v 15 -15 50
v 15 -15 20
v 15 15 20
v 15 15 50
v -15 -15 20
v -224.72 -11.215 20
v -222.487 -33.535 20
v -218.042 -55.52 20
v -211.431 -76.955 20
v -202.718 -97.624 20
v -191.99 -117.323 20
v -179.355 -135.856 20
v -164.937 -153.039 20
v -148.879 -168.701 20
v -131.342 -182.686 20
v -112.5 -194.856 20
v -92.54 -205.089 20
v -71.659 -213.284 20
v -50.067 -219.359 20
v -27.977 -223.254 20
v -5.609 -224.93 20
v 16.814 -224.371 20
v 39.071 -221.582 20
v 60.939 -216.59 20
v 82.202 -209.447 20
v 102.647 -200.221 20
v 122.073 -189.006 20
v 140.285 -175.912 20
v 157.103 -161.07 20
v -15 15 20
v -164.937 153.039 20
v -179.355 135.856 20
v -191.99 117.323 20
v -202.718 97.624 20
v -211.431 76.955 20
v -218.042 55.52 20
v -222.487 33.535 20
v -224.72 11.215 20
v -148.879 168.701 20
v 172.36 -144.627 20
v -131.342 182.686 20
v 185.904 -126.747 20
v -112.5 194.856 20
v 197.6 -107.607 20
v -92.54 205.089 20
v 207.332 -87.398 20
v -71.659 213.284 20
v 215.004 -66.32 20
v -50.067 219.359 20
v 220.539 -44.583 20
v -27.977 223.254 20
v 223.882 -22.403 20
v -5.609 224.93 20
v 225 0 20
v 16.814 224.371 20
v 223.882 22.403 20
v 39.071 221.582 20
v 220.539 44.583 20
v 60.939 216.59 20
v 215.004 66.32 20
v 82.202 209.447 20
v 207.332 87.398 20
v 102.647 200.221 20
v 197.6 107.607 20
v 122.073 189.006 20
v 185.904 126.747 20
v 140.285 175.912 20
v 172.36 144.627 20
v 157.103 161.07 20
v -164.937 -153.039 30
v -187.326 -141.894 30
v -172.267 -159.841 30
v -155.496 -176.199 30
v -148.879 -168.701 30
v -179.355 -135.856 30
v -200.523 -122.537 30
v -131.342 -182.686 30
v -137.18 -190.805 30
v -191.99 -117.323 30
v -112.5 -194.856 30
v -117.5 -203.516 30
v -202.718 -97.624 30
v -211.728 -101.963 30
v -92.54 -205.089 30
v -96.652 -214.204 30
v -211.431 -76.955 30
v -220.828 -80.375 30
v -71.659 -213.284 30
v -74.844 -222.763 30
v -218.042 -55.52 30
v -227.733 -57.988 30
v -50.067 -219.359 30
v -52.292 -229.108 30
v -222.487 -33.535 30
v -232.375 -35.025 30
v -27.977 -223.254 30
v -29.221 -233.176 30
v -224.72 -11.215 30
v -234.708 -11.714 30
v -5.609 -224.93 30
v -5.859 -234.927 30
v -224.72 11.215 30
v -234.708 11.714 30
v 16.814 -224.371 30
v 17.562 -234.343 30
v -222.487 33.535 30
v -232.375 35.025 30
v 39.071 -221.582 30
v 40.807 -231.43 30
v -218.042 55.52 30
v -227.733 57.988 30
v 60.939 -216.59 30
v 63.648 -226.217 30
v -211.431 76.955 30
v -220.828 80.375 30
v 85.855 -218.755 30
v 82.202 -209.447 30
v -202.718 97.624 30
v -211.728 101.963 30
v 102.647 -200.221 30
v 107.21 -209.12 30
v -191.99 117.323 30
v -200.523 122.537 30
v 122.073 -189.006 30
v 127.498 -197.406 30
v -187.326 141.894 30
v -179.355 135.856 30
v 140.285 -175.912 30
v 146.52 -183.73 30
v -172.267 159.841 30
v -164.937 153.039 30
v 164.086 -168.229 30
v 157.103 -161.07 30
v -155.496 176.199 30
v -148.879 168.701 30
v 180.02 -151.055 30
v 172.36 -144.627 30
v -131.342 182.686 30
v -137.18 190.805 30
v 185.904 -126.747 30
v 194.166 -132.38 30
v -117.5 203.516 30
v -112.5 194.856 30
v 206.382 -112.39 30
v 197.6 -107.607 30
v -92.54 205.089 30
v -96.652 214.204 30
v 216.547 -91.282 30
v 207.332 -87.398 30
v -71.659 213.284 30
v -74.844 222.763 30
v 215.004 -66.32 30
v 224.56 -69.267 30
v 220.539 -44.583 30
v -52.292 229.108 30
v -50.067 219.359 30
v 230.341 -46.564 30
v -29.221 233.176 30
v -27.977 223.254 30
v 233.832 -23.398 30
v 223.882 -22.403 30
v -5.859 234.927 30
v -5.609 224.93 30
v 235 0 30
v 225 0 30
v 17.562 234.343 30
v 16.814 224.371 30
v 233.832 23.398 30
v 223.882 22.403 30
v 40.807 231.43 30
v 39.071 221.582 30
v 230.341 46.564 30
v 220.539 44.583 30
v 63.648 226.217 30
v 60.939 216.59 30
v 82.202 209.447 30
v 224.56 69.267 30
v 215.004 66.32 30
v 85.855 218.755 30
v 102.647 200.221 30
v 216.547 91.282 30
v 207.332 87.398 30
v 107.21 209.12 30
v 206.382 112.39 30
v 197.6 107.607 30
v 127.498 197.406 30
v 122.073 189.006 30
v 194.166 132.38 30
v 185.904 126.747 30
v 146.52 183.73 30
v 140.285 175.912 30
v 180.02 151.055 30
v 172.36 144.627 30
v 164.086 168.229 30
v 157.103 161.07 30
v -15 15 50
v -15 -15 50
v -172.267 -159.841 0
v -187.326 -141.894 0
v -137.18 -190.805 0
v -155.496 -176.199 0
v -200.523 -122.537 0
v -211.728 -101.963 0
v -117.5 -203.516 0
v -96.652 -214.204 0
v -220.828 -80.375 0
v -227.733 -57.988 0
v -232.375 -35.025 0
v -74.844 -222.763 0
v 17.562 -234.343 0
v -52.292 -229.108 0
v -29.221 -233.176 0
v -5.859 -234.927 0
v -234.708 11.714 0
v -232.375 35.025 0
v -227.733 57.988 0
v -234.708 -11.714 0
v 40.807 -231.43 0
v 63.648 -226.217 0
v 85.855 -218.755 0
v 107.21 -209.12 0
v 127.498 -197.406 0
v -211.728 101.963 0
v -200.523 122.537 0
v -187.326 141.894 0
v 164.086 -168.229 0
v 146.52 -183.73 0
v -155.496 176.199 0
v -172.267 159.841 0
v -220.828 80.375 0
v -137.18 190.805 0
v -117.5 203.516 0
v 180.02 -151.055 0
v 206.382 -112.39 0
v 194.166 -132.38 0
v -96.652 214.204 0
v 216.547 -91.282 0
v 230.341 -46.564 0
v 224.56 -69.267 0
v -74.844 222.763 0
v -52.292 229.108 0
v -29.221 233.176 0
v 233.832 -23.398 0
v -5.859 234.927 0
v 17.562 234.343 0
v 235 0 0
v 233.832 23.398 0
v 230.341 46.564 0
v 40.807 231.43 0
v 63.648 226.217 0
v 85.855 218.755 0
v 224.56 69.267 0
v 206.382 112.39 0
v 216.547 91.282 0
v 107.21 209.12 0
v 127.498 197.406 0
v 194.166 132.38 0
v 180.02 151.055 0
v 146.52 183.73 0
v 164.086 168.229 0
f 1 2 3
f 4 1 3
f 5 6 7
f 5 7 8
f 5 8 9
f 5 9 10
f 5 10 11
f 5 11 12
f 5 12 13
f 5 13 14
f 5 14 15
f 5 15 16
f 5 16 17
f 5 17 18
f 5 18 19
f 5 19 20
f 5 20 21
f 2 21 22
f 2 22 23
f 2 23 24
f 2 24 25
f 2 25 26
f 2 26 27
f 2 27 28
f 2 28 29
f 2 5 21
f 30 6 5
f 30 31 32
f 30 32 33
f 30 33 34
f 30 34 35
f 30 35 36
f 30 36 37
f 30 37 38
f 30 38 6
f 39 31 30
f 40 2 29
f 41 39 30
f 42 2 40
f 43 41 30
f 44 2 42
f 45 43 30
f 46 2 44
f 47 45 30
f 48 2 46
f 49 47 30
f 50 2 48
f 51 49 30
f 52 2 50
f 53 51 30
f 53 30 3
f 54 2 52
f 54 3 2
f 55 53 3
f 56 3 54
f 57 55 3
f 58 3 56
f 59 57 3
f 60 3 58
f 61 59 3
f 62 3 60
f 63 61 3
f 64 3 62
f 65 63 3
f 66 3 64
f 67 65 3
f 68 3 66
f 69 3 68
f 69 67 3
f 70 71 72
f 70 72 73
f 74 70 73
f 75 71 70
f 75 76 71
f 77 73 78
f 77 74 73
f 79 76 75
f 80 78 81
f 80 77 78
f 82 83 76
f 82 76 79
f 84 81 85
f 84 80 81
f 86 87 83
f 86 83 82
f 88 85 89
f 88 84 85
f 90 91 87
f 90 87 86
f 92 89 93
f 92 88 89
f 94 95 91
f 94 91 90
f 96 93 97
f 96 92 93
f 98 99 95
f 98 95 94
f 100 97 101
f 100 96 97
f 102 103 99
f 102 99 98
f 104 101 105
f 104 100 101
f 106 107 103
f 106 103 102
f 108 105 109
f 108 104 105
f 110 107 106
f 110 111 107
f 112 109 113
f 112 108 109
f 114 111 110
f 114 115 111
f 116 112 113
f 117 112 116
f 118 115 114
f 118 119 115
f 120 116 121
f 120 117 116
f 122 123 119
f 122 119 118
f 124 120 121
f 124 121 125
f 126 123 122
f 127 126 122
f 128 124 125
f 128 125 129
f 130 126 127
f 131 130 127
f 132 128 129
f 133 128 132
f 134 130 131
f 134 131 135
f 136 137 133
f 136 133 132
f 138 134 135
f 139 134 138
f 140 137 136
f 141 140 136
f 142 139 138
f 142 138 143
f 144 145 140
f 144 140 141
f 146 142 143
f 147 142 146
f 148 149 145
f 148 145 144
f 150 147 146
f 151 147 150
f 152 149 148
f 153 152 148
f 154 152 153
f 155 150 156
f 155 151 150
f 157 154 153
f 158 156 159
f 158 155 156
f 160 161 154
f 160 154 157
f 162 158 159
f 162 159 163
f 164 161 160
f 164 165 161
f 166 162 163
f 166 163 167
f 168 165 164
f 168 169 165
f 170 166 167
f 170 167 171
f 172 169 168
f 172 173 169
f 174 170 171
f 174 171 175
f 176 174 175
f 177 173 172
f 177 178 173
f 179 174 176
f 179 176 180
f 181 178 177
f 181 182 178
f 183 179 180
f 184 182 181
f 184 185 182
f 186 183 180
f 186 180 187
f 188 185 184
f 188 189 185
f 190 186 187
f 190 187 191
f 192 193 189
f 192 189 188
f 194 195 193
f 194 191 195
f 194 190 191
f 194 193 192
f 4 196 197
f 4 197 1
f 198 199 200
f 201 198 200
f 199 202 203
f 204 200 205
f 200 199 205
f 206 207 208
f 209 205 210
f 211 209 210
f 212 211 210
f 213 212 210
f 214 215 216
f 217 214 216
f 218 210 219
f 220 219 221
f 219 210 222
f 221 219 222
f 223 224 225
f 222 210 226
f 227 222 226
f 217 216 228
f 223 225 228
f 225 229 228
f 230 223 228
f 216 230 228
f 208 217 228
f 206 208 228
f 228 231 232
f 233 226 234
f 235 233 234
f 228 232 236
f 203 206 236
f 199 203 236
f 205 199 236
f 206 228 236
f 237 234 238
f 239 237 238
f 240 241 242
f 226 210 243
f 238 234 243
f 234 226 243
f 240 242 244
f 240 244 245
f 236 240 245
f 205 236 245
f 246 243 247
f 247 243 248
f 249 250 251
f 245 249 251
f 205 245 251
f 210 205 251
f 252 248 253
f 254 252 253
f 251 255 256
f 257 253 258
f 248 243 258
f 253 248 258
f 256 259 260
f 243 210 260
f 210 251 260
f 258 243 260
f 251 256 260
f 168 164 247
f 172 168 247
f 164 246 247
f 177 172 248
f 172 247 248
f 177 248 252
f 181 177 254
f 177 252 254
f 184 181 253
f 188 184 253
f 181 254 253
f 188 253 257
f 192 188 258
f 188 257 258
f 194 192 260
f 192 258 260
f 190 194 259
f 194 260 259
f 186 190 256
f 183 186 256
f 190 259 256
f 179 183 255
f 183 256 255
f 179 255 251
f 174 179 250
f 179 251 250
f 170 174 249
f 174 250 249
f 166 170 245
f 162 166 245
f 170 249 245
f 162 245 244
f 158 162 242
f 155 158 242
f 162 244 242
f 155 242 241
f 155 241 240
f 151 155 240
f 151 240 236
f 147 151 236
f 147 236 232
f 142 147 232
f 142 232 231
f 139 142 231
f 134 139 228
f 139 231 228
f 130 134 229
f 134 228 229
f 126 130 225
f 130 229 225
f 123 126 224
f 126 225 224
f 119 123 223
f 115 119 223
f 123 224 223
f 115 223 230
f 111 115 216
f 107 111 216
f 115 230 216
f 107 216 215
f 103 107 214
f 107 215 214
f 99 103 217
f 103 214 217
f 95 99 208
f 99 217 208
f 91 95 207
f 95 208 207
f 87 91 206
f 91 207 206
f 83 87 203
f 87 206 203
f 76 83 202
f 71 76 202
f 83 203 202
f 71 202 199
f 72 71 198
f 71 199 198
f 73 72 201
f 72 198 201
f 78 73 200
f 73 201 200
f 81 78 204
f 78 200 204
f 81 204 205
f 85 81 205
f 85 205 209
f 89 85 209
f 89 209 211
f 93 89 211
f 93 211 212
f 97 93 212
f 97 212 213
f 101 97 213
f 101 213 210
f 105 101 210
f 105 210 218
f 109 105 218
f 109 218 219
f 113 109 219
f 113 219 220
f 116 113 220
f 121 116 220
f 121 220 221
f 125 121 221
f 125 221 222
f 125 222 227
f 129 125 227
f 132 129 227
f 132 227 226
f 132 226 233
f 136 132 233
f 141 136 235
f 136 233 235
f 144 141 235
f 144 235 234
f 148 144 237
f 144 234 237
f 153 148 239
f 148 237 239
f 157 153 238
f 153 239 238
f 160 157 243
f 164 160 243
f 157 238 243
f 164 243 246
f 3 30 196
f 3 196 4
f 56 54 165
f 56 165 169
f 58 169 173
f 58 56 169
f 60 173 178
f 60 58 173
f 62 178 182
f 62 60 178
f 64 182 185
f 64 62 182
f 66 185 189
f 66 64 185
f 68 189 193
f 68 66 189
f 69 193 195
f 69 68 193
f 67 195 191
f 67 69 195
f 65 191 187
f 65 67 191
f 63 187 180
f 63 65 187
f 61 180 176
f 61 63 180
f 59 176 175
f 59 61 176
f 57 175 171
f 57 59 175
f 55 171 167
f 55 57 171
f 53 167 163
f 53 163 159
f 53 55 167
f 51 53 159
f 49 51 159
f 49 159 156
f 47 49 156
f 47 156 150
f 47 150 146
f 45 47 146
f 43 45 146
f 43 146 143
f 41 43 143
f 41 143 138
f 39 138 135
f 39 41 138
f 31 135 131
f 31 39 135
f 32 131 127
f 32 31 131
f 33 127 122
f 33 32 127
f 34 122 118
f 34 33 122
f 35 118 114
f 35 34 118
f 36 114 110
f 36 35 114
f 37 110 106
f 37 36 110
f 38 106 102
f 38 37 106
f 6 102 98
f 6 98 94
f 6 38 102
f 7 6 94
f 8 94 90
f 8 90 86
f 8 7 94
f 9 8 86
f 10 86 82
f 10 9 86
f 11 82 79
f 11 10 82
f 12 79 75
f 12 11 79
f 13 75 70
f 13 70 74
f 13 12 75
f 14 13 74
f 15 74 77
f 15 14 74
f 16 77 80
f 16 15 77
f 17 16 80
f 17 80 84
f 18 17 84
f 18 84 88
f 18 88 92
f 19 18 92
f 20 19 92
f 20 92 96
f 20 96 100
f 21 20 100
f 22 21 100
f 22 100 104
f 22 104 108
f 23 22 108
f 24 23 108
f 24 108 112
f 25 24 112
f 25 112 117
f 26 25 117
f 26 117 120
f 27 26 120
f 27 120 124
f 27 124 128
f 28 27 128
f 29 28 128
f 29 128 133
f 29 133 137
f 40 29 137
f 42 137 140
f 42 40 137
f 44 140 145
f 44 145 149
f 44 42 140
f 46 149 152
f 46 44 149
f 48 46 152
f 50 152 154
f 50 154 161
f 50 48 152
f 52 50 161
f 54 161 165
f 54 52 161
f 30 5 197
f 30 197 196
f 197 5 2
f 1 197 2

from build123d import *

# Parameters (mm, degrees)
SCHIZZO1_R                   = 235
ESTRUSIONE_ESTRUSIONE1_DEPTH = 20
SCHIZZO2_R                   = 235
SCHIZZO2_R_2                 = 225
ESTRUSIONE_ESTRUSIONE2_DEPTH = 10
SCHIZZO3_W                   = 30
SCHIZZO3_H                   = 30
ESTRUSIONE_ESTRUSIONE3_DEPTH = 30


with BuildPart() as part:
    # Schizzo1 → Estrusione-Estrusione1 (new body)
    with BuildSketch(Plane.XY):
        Circle(SCHIZZO1_R)
    extrude(amount=ESTRUSIONE_ESTRUSIONE1_DEPTH)

    # Schizzo2 → Estrusione-Estrusione2 (add)
    with BuildSketch(Plane.XY.offset(20)):
        Circle(SCHIZZO2_R)
        Circle(SCHIZZO2_R_2, mode=Mode.SUBTRACT)
    extrude(amount=ESTRUSIONE_ESTRUSIONE2_DEPTH)

    # Schizzo3 → Estrusione-Estrusione3 (add)
    with BuildSketch(Plane.XY.offset(20)):
        Rectangle(SCHIZZO3_W, SCHIZZO3_H)
    extrude(amount=ESTRUSIONE_ESTRUSIONE3_DEPTH)


solid = part.part
